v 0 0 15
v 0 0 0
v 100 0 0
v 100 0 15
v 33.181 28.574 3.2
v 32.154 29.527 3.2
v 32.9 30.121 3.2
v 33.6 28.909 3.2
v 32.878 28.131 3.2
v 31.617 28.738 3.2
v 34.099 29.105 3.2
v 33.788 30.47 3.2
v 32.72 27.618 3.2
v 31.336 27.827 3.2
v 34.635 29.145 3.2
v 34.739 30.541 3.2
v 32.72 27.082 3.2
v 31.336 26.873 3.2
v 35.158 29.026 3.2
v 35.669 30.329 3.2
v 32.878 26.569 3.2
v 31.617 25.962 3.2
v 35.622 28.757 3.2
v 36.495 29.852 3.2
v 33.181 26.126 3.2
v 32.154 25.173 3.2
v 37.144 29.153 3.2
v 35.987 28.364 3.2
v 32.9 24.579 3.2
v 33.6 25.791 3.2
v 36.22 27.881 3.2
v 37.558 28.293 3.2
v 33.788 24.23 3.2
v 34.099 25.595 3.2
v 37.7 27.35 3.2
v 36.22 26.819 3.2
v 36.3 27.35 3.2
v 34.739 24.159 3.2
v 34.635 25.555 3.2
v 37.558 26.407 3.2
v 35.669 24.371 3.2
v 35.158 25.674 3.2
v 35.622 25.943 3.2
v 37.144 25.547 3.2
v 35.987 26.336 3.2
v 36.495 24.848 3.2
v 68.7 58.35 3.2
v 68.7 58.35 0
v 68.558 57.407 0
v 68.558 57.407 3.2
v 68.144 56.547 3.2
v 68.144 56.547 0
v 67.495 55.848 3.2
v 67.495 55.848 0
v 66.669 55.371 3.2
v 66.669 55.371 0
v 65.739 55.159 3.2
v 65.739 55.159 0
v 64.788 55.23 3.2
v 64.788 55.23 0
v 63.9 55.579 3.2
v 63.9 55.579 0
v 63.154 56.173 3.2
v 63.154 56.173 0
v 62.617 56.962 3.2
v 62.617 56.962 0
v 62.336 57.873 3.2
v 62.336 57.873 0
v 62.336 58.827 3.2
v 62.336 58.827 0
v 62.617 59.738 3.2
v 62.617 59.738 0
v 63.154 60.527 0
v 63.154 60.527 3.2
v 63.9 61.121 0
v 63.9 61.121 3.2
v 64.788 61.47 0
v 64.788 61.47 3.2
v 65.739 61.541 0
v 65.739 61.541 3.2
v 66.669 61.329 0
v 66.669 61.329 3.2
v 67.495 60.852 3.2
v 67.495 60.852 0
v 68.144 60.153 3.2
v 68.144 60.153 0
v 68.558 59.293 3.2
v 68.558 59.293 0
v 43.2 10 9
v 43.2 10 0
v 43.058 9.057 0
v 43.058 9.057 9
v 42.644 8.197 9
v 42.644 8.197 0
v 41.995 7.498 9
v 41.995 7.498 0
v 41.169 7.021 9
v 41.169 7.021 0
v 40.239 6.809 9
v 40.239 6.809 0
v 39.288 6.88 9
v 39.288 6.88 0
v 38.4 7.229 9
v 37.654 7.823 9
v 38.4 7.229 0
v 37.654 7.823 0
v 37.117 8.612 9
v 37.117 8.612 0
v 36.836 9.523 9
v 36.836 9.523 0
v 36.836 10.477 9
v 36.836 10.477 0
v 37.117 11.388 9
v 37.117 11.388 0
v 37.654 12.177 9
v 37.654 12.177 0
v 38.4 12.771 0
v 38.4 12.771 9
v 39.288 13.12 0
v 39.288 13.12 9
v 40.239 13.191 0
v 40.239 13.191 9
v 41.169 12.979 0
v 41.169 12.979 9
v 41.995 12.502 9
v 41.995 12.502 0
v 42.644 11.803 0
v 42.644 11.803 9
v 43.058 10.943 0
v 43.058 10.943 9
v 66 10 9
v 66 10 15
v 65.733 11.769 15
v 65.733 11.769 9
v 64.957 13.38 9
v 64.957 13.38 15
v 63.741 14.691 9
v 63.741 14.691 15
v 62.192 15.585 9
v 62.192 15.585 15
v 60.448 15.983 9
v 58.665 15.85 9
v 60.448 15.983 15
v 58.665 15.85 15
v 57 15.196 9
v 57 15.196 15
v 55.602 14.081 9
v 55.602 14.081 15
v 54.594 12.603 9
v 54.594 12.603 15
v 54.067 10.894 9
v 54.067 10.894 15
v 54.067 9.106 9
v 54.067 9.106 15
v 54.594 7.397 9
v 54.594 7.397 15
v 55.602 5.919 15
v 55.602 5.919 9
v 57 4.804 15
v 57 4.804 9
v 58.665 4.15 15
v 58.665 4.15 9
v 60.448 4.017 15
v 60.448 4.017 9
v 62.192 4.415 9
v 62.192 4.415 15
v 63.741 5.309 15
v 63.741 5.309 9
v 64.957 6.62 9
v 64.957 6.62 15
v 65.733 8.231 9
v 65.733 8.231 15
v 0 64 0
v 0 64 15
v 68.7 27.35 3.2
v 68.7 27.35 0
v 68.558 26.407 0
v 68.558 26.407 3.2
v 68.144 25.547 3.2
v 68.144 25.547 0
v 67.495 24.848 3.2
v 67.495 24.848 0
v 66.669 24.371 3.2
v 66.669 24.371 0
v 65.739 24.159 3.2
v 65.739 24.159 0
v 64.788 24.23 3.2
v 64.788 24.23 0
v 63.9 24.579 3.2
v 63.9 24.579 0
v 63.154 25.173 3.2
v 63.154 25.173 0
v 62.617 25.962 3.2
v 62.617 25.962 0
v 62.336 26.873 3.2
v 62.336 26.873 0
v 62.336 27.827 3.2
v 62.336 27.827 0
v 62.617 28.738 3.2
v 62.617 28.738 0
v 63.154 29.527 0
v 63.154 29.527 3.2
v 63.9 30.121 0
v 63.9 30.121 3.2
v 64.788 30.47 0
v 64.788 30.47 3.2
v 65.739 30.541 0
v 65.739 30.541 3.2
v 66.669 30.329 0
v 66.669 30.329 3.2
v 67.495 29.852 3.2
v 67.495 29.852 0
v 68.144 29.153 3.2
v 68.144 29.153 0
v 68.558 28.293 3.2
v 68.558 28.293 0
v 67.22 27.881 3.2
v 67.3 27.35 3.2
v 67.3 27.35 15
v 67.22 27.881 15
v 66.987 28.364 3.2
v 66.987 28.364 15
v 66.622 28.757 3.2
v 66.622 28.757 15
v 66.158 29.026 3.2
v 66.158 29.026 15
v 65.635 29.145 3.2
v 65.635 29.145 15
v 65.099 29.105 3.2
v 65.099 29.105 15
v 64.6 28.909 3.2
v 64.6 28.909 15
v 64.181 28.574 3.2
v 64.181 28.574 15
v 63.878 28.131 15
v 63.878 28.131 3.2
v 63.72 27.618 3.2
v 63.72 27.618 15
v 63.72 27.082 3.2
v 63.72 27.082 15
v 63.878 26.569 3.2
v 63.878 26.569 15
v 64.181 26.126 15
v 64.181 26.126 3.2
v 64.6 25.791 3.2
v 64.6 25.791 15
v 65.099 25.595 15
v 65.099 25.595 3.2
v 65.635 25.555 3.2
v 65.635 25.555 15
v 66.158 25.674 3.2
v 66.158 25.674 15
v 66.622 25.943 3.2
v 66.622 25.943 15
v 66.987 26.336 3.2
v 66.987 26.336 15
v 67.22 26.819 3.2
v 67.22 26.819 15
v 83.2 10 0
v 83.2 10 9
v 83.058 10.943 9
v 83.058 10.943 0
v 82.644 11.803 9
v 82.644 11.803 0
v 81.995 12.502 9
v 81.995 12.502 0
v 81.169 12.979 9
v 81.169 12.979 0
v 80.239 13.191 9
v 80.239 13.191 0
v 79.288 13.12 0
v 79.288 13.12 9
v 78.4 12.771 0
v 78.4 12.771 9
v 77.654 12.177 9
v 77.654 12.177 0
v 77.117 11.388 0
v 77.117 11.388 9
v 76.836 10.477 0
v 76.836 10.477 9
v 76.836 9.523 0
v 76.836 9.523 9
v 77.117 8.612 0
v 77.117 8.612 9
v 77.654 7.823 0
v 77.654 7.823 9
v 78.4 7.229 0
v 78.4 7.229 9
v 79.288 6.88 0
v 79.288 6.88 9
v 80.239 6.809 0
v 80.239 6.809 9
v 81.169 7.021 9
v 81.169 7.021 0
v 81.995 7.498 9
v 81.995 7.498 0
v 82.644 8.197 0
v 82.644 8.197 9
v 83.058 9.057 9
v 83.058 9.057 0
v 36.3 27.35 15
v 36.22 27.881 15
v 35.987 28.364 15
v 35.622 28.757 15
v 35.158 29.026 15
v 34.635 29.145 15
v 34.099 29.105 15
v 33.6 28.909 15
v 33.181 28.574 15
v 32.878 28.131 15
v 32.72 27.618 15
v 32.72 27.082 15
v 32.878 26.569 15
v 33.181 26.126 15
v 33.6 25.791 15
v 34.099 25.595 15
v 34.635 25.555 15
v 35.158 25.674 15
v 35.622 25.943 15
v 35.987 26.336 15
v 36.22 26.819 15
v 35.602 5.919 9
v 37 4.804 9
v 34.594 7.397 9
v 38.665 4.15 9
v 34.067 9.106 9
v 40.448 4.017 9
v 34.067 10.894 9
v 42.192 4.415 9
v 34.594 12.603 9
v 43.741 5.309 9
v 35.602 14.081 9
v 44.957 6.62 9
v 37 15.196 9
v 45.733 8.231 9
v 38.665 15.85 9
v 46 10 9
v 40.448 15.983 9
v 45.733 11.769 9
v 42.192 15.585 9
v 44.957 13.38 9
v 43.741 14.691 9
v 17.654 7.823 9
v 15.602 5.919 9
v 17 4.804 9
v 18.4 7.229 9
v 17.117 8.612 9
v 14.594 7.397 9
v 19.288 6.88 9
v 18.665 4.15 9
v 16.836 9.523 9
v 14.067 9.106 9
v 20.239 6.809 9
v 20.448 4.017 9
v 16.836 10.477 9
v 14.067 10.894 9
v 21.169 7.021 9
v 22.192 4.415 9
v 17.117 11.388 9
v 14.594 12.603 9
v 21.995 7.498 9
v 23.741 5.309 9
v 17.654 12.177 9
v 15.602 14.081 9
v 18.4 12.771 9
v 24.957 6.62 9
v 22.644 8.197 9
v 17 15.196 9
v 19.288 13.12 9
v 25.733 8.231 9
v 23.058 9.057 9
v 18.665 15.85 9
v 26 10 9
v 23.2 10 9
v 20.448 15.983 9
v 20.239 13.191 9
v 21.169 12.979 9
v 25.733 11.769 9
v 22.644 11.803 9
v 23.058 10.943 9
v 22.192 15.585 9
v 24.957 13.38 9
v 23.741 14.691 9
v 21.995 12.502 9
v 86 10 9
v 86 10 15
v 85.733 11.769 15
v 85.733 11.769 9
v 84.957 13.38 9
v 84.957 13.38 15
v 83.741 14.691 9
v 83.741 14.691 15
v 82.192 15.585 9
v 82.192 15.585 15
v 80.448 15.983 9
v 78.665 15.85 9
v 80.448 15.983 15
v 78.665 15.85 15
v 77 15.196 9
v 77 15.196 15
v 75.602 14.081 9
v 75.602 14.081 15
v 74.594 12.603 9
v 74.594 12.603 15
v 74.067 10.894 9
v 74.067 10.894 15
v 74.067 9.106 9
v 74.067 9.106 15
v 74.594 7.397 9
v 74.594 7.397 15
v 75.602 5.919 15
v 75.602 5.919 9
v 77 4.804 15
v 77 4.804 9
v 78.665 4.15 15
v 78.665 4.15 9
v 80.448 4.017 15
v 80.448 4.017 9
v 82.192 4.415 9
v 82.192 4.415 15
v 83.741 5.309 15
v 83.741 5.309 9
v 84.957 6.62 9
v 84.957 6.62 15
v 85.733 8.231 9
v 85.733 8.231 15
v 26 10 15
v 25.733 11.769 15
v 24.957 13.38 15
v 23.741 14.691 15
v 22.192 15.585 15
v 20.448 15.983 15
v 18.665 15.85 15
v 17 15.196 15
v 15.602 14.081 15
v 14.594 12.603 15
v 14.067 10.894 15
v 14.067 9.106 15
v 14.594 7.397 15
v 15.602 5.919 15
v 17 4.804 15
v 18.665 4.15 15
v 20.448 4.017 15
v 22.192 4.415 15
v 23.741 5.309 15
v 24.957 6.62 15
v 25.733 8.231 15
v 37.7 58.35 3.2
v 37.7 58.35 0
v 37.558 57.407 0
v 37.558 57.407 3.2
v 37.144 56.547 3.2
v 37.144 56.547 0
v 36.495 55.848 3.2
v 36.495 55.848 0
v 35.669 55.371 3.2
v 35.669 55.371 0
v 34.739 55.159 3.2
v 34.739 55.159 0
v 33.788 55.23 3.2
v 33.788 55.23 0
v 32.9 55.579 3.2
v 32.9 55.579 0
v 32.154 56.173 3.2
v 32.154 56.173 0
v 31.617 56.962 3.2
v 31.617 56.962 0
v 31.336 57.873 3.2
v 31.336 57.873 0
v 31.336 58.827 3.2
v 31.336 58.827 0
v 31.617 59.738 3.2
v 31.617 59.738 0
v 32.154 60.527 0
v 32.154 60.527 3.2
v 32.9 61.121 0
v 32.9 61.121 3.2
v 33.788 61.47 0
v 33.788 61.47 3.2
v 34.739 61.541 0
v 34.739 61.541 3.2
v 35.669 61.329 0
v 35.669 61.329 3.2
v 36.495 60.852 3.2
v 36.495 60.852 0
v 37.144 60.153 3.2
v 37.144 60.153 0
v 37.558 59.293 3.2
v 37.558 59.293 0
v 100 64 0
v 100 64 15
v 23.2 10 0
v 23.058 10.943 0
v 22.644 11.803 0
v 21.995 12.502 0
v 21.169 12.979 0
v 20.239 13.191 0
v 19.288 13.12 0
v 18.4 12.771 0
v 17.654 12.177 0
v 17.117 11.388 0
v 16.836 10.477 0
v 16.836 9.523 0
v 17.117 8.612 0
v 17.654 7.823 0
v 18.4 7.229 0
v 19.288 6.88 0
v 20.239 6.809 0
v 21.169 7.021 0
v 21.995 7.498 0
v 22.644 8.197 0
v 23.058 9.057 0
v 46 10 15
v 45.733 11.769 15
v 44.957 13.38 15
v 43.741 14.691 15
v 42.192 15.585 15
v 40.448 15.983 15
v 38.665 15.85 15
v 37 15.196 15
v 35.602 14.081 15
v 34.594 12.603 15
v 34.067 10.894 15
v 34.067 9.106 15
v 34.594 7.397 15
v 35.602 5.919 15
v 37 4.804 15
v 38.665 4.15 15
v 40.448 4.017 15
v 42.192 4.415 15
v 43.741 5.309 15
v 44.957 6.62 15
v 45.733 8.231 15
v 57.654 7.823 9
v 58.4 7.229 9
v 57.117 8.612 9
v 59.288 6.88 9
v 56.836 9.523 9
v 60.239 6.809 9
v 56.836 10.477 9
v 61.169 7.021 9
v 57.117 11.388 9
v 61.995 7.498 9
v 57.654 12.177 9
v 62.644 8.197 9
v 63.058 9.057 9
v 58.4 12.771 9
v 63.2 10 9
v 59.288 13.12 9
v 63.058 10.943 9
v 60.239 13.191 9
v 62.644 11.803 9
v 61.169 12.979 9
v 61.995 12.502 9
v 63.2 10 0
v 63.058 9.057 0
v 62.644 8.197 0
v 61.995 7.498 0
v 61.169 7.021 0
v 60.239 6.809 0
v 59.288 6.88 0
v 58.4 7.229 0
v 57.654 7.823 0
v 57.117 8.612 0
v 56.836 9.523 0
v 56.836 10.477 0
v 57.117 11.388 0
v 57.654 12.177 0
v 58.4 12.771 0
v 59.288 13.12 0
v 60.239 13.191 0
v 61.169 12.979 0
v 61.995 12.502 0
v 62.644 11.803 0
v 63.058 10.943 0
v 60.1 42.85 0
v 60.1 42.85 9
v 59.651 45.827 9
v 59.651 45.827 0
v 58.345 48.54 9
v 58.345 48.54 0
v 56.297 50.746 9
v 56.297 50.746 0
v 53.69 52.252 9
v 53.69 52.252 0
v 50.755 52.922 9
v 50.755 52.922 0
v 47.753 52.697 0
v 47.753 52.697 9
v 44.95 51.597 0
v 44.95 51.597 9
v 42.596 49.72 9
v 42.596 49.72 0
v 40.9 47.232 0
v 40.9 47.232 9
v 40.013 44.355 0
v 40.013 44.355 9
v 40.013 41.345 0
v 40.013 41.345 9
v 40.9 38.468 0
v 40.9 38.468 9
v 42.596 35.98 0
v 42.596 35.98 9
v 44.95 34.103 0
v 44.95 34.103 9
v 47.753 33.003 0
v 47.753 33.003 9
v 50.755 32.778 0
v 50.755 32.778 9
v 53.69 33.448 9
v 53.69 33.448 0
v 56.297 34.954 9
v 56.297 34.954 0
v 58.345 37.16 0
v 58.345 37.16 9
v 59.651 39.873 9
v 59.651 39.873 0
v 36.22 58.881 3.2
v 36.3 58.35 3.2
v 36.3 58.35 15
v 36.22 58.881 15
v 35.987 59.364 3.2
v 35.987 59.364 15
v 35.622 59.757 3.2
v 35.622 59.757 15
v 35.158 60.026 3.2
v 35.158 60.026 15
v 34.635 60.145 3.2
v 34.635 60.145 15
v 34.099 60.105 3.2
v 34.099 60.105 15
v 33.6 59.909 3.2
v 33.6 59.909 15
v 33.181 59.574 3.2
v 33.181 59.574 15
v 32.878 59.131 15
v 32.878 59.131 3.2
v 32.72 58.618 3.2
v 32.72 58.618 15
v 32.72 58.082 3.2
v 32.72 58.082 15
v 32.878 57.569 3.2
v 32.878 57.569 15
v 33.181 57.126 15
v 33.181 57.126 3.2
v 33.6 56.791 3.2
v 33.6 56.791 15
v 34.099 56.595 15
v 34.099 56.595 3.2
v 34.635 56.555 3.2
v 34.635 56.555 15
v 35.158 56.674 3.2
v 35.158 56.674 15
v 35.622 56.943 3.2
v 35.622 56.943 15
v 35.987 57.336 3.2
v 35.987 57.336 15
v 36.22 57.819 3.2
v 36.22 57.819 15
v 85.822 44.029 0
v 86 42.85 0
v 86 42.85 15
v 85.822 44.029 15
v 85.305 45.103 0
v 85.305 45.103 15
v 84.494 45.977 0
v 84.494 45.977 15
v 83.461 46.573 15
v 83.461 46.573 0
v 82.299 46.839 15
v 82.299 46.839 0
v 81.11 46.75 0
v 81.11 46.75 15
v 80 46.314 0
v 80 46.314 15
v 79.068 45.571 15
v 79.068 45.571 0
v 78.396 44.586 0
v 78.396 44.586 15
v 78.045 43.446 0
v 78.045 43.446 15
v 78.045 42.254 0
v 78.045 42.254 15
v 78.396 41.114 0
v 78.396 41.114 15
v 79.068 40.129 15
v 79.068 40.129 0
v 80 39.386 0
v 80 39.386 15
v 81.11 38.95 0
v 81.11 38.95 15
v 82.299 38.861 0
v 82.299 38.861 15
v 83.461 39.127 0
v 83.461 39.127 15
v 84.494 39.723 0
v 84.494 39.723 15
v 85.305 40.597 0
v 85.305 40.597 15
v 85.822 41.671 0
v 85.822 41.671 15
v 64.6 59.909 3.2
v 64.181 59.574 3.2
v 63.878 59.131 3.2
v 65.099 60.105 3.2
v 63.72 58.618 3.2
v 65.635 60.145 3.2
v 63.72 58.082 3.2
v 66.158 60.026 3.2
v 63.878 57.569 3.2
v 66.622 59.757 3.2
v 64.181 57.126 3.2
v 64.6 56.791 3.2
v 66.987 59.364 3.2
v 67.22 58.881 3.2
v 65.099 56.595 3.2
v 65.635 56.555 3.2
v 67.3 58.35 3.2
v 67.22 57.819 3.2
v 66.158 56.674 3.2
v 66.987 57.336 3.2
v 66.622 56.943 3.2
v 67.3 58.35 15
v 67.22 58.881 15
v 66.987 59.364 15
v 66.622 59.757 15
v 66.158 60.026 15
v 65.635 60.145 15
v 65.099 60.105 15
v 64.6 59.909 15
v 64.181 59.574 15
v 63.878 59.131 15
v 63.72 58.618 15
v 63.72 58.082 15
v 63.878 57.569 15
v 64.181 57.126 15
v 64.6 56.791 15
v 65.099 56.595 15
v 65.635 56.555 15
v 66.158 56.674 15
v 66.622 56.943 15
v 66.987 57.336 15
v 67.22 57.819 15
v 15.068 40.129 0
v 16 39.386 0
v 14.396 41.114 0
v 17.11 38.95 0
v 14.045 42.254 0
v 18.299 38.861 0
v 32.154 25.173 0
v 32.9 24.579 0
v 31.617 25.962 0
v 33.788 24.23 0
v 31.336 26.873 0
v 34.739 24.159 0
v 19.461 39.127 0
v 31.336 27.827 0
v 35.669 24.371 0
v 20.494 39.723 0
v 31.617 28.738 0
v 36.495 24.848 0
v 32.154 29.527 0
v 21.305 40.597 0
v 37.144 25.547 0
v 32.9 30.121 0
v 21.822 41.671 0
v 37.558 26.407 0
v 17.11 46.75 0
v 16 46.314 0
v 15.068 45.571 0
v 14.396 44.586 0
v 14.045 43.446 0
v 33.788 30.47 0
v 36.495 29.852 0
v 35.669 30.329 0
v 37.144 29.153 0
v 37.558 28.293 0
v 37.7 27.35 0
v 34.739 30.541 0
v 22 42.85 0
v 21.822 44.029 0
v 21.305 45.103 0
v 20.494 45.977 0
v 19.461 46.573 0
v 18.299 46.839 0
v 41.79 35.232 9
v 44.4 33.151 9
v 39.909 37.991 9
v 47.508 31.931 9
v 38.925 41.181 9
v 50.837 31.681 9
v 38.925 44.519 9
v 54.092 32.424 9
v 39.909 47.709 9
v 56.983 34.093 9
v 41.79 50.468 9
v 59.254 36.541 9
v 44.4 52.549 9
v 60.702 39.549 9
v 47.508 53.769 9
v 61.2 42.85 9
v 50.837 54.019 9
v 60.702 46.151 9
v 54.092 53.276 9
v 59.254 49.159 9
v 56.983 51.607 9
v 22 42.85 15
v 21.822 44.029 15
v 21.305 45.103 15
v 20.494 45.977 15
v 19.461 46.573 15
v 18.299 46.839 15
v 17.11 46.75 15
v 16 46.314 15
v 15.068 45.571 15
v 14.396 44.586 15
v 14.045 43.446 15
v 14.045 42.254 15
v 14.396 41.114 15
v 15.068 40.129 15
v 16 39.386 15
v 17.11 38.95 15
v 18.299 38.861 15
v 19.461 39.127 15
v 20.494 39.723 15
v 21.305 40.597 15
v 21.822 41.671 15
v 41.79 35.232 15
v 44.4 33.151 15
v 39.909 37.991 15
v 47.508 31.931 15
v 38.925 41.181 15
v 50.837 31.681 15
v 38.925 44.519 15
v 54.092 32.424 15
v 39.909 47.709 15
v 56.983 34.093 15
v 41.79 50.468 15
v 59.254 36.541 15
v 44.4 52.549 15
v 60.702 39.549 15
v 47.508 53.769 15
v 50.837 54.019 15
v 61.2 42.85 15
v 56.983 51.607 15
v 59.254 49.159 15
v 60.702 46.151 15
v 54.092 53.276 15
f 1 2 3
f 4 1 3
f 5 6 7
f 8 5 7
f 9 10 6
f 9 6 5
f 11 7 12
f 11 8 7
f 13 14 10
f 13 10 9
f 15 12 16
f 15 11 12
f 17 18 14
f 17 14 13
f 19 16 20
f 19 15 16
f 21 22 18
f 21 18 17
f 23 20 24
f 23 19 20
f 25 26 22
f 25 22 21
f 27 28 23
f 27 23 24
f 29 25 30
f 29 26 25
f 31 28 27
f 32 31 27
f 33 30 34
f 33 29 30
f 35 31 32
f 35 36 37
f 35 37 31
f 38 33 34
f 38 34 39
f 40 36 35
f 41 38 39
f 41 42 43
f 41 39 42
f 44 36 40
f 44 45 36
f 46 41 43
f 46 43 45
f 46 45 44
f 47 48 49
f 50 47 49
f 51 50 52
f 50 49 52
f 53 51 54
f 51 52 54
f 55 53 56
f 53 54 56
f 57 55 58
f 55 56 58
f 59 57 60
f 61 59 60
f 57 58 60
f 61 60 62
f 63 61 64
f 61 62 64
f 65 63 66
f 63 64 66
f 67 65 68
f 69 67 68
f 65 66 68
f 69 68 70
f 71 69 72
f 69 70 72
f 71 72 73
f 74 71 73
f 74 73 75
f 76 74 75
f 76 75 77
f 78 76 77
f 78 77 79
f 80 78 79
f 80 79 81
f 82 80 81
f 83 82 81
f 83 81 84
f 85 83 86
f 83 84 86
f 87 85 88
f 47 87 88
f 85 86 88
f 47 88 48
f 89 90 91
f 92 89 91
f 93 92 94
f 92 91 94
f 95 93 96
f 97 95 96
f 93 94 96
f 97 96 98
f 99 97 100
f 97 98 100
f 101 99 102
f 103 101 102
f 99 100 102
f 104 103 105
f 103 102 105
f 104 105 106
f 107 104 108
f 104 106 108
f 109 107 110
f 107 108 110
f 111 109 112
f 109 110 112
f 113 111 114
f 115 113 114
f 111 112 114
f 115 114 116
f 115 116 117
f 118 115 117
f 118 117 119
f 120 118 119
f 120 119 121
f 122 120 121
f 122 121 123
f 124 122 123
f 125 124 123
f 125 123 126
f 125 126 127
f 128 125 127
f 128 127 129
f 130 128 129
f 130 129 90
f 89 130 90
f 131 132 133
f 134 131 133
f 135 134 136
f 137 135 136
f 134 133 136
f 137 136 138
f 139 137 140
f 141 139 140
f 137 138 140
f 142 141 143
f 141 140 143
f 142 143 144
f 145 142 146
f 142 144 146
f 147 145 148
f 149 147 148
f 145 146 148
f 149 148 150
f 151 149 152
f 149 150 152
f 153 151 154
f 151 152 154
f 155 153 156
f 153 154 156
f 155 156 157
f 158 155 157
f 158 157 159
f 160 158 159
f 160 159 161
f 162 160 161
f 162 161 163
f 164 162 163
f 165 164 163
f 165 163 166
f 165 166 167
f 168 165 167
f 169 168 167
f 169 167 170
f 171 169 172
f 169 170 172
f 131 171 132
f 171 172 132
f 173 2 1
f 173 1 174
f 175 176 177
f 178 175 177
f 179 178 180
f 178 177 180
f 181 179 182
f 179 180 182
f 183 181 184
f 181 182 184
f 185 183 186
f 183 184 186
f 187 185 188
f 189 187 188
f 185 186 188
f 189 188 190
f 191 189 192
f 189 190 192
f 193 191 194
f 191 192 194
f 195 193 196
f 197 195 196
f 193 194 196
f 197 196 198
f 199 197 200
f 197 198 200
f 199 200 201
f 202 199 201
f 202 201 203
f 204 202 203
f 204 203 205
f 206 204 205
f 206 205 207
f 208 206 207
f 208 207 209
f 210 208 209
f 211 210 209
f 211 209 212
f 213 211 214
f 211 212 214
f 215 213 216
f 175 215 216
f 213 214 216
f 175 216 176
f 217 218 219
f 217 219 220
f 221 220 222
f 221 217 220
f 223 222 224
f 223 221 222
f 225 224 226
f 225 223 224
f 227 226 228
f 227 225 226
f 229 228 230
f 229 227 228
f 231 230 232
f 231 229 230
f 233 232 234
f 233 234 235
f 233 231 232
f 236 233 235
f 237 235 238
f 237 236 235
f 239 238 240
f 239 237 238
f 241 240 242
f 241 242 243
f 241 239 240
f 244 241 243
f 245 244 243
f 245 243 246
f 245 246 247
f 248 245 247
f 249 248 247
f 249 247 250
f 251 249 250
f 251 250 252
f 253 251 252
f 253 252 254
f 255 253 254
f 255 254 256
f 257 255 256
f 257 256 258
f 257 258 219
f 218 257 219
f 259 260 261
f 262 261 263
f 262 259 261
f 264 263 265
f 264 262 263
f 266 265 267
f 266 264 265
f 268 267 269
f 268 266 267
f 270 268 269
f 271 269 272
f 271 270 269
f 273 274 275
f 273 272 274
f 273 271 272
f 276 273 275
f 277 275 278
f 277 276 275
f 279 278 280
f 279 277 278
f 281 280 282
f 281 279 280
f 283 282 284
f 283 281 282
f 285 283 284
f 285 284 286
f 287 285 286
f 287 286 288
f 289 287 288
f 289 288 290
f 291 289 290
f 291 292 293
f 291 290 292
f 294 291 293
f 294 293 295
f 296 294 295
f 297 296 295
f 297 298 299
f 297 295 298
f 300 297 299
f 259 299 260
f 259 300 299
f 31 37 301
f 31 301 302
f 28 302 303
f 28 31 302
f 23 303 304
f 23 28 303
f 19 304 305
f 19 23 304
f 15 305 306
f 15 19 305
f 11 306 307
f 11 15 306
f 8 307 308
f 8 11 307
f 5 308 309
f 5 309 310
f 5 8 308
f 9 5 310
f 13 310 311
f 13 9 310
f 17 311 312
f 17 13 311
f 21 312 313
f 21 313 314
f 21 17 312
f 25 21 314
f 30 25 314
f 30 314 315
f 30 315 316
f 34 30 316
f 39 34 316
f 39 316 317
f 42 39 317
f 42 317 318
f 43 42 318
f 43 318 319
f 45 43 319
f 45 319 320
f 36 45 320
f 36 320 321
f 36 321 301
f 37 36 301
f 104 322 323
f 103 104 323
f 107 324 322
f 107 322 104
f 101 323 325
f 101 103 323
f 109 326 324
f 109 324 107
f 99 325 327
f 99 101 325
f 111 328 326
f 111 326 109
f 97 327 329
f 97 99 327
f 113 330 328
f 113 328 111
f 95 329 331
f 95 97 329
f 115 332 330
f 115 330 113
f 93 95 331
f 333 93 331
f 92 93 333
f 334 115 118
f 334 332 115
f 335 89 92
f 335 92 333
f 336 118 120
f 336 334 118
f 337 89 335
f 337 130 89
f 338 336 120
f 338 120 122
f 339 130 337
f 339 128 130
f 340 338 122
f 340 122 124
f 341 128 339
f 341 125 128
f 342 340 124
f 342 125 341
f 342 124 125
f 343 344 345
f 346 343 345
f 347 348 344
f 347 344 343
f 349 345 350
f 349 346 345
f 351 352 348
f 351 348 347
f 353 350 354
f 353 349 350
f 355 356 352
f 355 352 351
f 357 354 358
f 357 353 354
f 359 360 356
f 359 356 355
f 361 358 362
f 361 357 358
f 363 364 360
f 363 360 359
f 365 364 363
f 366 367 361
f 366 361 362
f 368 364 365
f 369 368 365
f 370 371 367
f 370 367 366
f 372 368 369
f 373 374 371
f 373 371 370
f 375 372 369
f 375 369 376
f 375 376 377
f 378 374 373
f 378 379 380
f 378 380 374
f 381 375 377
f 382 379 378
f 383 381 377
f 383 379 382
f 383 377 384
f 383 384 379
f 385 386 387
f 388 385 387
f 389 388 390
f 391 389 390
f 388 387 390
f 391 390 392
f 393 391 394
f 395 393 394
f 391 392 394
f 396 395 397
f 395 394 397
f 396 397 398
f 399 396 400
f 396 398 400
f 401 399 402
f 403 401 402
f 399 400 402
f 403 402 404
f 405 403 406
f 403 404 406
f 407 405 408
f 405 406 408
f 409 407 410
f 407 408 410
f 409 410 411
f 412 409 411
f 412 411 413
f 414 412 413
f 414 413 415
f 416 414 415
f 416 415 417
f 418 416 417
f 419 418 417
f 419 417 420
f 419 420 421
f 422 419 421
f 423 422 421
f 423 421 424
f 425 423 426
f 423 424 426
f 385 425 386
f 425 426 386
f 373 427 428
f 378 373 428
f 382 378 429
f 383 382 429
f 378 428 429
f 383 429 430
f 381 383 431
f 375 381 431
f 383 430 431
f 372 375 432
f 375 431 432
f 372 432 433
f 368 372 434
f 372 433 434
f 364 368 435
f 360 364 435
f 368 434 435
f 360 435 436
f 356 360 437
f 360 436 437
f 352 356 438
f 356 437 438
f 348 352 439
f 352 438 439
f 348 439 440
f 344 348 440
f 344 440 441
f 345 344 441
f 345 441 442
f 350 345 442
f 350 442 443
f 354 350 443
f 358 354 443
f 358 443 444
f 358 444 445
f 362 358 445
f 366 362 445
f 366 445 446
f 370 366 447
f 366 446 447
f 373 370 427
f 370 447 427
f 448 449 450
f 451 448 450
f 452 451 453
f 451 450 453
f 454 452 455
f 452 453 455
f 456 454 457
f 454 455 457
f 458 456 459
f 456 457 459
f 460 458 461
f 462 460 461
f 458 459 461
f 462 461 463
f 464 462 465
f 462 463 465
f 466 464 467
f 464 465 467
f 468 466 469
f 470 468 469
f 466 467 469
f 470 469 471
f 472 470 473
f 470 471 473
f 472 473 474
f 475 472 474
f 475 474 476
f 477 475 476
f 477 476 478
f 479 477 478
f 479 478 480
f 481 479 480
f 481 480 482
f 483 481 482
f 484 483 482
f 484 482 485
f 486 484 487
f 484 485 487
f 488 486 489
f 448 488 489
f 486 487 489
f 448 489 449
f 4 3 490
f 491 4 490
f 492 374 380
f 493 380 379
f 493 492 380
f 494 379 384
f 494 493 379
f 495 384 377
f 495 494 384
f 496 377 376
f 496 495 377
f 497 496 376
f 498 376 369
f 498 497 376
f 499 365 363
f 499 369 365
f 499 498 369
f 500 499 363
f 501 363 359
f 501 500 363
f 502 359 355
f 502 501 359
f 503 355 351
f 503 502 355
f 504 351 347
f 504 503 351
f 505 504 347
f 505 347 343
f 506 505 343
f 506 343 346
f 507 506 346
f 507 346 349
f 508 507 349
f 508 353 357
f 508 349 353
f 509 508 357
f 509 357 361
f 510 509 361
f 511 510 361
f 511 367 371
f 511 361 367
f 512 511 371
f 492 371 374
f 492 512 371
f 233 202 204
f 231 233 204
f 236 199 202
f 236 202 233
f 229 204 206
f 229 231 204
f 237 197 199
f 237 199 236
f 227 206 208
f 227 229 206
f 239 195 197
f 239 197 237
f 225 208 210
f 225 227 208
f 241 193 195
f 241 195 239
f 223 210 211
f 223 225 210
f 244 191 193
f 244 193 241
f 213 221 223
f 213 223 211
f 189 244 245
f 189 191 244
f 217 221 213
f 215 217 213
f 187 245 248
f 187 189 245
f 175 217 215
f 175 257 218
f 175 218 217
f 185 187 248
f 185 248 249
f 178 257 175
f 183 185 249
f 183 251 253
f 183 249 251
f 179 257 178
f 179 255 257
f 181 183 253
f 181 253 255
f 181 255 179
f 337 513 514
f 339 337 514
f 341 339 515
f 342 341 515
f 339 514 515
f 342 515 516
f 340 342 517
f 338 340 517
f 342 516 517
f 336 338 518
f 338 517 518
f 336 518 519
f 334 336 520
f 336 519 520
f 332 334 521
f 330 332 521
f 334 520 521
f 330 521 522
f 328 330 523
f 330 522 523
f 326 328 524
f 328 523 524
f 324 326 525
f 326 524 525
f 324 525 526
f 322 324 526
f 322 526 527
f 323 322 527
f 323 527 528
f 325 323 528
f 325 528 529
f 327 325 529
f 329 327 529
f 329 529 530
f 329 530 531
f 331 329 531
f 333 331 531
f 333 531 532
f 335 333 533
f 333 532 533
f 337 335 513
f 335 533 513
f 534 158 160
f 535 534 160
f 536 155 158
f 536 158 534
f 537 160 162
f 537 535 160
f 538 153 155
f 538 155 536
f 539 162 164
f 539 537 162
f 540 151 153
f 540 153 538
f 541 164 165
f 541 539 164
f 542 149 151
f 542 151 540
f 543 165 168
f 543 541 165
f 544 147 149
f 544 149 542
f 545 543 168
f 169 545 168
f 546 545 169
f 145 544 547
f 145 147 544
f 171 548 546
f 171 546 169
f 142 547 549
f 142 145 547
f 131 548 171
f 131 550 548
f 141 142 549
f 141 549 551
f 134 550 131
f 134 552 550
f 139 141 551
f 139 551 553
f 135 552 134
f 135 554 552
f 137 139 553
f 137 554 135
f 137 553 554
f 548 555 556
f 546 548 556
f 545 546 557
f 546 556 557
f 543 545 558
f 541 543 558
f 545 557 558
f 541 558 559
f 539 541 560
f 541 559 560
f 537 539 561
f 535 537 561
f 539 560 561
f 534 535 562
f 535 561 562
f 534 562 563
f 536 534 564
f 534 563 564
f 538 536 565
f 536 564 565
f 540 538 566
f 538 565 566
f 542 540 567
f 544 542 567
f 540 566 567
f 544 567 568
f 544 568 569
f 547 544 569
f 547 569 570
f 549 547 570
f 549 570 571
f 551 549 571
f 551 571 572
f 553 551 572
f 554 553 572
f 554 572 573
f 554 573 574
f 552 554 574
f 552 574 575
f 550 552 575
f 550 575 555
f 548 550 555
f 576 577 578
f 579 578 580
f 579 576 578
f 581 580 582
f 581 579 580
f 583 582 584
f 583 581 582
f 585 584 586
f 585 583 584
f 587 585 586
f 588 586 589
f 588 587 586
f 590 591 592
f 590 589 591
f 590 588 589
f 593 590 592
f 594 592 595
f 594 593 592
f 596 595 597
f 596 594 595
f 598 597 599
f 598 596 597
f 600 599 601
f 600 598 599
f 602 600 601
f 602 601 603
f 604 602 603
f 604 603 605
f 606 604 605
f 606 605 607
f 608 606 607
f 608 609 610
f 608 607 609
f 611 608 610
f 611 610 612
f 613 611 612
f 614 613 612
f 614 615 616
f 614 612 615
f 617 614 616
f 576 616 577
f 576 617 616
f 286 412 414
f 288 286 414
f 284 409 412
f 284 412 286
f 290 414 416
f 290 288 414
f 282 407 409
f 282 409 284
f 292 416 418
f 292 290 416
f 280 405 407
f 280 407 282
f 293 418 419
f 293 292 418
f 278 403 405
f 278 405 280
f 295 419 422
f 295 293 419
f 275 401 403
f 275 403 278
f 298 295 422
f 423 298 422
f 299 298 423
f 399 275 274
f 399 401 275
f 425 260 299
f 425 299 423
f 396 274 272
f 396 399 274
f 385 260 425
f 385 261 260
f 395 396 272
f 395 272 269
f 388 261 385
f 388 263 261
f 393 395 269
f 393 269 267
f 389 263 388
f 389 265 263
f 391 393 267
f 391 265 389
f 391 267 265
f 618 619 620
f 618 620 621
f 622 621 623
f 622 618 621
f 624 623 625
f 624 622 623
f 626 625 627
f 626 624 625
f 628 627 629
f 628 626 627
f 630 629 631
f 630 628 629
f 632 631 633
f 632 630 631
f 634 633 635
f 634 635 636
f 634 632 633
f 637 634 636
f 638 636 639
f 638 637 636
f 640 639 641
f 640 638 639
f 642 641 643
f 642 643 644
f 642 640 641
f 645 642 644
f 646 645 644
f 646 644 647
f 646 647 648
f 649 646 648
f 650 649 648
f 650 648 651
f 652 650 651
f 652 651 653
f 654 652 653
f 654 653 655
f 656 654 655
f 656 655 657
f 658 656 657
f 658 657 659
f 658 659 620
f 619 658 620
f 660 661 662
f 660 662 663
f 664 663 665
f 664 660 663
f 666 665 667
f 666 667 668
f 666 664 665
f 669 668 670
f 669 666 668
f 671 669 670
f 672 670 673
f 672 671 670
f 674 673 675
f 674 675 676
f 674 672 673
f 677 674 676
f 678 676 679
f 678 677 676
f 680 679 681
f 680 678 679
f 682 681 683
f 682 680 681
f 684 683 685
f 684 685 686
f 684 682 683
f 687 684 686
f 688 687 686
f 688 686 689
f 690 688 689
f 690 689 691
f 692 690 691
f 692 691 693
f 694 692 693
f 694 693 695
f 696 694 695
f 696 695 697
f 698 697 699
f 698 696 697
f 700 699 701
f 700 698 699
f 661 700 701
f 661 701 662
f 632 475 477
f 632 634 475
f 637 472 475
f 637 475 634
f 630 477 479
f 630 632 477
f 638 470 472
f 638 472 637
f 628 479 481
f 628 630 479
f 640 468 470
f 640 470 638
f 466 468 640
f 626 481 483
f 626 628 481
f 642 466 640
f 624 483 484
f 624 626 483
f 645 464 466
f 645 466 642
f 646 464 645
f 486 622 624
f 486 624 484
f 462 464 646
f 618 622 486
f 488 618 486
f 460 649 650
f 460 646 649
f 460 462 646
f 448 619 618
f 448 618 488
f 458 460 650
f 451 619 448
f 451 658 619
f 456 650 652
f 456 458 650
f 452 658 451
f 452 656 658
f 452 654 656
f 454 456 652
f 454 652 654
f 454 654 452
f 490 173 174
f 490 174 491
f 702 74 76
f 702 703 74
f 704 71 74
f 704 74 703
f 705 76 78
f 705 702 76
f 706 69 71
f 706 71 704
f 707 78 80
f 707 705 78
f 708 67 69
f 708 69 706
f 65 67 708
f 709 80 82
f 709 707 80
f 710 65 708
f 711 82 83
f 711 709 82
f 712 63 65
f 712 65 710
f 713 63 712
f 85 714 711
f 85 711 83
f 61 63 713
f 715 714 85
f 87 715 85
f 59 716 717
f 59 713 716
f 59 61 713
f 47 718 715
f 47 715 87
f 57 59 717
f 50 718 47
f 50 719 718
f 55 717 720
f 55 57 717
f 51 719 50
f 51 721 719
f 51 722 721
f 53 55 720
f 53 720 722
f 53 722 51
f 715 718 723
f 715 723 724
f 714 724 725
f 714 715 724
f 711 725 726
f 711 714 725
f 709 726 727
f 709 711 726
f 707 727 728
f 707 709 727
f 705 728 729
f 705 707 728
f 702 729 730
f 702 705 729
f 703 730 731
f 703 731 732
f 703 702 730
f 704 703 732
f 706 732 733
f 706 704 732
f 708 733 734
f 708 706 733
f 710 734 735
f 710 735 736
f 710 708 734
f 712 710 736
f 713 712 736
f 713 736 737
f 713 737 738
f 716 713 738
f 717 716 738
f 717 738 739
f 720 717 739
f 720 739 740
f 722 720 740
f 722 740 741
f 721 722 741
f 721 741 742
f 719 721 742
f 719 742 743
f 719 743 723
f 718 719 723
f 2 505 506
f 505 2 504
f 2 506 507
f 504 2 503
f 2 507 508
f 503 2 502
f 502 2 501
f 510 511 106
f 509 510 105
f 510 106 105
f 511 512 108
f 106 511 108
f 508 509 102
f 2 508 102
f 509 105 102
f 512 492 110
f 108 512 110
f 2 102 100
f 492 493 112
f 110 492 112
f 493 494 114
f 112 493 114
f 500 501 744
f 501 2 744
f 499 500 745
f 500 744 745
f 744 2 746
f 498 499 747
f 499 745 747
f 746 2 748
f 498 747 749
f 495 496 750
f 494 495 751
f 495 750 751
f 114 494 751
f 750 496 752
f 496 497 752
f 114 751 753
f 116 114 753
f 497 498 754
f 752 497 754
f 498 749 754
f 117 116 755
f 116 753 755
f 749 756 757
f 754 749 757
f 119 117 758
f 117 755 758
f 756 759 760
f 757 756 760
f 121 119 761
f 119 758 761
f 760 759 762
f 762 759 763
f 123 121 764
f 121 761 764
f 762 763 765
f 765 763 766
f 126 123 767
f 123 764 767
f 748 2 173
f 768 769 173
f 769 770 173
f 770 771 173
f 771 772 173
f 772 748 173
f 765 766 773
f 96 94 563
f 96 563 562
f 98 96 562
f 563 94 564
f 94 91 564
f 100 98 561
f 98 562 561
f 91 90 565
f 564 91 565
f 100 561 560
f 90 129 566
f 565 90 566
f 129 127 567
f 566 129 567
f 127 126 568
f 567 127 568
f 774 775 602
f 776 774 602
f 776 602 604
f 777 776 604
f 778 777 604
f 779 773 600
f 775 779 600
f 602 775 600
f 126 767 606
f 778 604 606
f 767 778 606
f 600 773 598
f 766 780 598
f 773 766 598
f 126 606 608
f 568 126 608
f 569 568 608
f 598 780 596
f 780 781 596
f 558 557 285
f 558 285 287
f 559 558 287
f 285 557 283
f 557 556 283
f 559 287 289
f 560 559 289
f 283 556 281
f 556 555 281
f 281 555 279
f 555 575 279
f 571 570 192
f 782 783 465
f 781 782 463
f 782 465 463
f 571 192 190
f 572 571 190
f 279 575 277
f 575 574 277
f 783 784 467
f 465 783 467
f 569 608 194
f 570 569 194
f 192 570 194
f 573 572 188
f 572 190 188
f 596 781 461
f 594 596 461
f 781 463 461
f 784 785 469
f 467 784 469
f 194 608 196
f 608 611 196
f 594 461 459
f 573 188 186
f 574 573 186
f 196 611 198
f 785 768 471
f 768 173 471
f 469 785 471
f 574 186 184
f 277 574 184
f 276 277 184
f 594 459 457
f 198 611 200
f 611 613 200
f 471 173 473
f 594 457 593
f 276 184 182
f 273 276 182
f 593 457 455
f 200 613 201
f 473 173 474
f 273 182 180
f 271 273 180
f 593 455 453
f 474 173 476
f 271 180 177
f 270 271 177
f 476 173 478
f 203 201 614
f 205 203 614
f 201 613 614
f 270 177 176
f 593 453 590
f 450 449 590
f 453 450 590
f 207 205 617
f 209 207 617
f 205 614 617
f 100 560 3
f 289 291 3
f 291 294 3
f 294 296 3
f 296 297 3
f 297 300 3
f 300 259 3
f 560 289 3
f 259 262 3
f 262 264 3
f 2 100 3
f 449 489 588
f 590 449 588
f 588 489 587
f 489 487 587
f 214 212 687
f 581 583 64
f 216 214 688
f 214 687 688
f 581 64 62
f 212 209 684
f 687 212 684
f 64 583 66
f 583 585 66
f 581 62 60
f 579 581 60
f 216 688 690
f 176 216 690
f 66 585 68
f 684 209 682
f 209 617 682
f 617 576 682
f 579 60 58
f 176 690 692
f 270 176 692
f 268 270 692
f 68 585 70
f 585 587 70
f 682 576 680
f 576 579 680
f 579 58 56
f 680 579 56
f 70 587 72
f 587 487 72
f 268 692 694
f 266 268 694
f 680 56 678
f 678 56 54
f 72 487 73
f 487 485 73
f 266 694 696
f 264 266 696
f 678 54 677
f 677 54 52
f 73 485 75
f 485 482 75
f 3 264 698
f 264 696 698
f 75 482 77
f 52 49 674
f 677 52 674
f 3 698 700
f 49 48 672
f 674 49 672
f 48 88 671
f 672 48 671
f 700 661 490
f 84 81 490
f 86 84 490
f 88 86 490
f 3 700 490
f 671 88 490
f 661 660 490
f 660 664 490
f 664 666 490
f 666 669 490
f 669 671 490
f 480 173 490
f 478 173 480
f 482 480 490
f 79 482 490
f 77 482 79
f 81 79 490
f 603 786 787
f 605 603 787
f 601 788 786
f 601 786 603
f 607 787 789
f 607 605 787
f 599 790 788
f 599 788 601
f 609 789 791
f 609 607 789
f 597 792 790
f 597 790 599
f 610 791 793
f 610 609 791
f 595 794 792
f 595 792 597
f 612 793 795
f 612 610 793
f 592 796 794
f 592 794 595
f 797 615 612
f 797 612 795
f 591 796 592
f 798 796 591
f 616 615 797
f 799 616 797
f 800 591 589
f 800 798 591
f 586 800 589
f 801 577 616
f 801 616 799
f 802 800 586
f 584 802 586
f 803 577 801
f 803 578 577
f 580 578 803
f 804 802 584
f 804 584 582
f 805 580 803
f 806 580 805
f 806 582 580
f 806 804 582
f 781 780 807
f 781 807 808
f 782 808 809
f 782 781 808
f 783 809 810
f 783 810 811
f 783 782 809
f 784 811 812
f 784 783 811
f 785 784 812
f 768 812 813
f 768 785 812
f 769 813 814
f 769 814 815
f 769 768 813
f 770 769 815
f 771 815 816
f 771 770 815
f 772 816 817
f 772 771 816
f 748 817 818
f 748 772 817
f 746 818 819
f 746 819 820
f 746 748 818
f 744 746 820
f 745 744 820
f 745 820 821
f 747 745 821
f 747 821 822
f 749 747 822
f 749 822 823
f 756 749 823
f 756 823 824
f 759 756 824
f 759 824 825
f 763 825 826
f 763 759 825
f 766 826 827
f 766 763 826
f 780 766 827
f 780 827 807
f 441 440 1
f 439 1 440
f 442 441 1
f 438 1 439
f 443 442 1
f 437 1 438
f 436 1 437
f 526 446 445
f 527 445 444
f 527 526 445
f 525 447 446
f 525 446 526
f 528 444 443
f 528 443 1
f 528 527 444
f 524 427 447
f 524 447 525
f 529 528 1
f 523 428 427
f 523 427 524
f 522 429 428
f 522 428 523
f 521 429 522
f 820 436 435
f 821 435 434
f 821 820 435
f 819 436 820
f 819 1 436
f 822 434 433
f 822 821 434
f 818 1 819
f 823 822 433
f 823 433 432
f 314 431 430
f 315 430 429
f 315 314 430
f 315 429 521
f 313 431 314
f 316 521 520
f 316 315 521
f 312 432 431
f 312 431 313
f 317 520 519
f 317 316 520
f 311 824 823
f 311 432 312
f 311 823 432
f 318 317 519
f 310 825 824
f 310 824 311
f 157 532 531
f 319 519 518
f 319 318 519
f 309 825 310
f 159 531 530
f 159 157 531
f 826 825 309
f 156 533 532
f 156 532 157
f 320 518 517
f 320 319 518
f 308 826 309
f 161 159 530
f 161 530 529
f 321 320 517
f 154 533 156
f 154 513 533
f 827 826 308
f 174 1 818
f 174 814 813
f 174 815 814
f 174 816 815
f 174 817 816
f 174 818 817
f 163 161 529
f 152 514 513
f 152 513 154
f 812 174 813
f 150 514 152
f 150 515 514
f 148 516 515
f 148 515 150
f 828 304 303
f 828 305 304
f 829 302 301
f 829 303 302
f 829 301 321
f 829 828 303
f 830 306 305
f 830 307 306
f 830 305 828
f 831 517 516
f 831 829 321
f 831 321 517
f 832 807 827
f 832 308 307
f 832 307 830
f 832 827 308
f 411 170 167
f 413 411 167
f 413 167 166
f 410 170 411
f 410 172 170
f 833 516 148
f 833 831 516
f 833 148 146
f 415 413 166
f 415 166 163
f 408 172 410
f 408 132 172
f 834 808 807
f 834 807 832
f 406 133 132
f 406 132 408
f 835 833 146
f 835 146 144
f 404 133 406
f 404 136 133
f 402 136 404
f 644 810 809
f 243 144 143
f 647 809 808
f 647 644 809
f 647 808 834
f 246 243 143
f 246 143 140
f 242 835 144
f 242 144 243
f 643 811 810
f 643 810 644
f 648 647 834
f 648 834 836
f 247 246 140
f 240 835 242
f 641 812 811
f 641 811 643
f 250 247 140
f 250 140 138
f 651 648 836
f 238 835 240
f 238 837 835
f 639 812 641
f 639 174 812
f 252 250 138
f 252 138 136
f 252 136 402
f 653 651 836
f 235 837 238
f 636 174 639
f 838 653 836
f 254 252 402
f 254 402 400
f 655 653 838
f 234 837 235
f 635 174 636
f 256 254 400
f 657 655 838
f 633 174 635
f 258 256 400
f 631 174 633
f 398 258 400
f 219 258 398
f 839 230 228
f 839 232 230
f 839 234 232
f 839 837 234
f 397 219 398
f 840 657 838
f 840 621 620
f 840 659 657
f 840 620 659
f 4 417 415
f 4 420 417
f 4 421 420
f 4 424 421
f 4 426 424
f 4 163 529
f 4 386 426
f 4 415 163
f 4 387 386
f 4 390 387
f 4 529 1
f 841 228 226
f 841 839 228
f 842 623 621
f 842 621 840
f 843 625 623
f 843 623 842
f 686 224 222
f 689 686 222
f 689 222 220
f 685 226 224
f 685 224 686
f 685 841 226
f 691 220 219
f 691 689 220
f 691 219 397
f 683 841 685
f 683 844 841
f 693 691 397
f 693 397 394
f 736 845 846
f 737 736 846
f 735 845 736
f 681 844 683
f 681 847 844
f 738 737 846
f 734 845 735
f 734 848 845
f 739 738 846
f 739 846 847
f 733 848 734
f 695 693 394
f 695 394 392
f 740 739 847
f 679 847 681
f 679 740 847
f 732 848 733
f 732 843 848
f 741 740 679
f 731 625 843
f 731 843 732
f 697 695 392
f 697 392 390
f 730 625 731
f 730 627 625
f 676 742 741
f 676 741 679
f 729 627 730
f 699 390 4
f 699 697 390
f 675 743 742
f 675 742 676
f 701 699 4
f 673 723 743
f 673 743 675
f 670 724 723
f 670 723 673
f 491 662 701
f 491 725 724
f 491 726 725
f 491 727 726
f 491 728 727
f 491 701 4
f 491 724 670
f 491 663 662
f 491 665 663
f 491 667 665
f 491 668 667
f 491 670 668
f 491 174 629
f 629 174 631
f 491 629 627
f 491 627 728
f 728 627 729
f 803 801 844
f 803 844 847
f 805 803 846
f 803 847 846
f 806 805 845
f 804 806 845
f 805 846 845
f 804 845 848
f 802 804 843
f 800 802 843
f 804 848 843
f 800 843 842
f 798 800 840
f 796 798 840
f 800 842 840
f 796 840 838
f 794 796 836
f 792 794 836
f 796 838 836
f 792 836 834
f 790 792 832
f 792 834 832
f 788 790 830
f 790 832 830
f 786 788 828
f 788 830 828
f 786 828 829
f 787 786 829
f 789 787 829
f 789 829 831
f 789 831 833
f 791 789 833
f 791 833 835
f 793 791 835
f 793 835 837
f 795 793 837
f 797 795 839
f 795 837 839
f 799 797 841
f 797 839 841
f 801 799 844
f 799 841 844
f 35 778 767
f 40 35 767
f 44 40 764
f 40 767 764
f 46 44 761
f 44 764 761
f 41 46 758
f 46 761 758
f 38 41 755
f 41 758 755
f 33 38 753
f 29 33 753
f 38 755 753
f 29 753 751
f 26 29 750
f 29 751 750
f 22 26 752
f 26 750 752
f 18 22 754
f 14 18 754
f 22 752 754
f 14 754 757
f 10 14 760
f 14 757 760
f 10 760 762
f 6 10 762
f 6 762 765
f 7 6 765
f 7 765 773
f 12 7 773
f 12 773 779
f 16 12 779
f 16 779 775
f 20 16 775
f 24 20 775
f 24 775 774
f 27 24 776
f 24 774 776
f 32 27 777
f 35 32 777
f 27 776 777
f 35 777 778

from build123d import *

# Parameters (mm, degrees)
SKETCH_W        = 100
SKETCH_H        = 64
SKETCH_R        = 10.1
SKETCH_R_2      = 1.8
SKETCH_R_3      = 3.2
SKETCH_R_4      = 4
PAD_DEPTH       = 15
SKETCH001_R     = 11.2
SKETCH001_R_2   = 6
POCKET_DEPTH    = 6
SKETCH002_R     = 3.2
POCKET001_DEPTH = 3.2
SKETCH003_R     = 6
POCKET002_DEPTH = 6
SKETCH004_R     = 3.2
POCKET003_DEPTH = 15


with BuildPart() as part:
    # Sketch → Pad (new body)
    with BuildSketch(Plane.XY):
        with Locations((50, 32)):
            Rectangle(SKETCH_W, SKETCH_H)
        with Locations((50, 42.85)):
            Circle(SKETCH_R, mode=Mode.SUBTRACT)
        with Locations((65.5, 58.35)):
            Circle(SKETCH_R_2, mode=Mode.SUBTRACT)
        with Locations((65.5, 27.35)):
            Circle(SKETCH_R_2, mode=Mode.SUBTRACT)
        with Locations((34.5, 27.35)):
            Circle(SKETCH_R_2, mode=Mode.SUBTRACT)
        with Locations((34.5, 58.35)):
            Circle(SKETCH_R_2, mode=Mode.SUBTRACT)
        with Locations((20, 10)):
            Circle(SKETCH_R_3, mode=Mode.SUBTRACT)
        with Locations((80, 10)):
            Circle(SKETCH_R_3, mode=Mode.SUBTRACT)
        with Locations((82, 42.85)):
            Circle(SKETCH_R_4, mode=Mode.SUBTRACT)
        with Locations((18, 42.85)):
            Circle(SKETCH_R_4, mode=Mode.SUBTRACT)
    extrude(amount=PAD_DEPTH)

    # Sketch001 (on Face15 of Pad) → Pocket (cut)
    with BuildSketch(Plane.XY.offset(15)):
        with Locations((50, 42.85)):
            Circle(SKETCH001_R)
        with Locations((20, 10)):
            Circle(SKETCH001_R_2)
        with Locations((80, 10)):
            Circle(SKETCH001_R_2)
    extrude(amount=-POCKET_DEPTH, mode=Mode.SUBTRACT)

    # Sketch002 (on Face4 of Pocket) → Pocket001 (cut)
    with BuildSketch(Plane(origin=(0, 0, 0), x_dir=(1, 0, 0), z_dir=(0, 0, -1))):
        with Locations((34.5, -27.35)):
            Circle(SKETCH002_R)
        with Locations((65.5, -27.35)):
            Circle(SKETCH002_R)
        with Locations((34.5, -58.35)):
            Circle(SKETCH002_R)
        with Locations((65.5, -58.35)):
            Circle(SKETCH002_R)
    extrude(amount=-POCKET001_DEPTH, mode=Mode.SUBTRACT)

    # Sketch003 (on Face5 of Pocket001) → Pocket002 (cut)
    with BuildSketch(Plane.XY.offset(15)):
        with Locations((40, 10)):
            Circle(SKETCH003_R)
        with Locations((60, 10)):
            Circle(SKETCH003_R)
    extrude(amount=-POCKET002_DEPTH, mode=Mode.SUBTRACT)

    # Sketch004 (on Face4 of Pocket002) → Pocket003 (cut)
    with BuildSketch(Plane(origin=(0, 0, 0), x_dir=(1, 0, 0), z_dir=(0, 0, -1))):
        with Locations((40, -10)):
            Circle(SKETCH004_R)
        with Locations((60, -10)):
            Circle(SKETCH004_R)
    extrude(amount=-POCKET003_DEPTH, mode=Mode.SUBTRACT)


solid = part.part
